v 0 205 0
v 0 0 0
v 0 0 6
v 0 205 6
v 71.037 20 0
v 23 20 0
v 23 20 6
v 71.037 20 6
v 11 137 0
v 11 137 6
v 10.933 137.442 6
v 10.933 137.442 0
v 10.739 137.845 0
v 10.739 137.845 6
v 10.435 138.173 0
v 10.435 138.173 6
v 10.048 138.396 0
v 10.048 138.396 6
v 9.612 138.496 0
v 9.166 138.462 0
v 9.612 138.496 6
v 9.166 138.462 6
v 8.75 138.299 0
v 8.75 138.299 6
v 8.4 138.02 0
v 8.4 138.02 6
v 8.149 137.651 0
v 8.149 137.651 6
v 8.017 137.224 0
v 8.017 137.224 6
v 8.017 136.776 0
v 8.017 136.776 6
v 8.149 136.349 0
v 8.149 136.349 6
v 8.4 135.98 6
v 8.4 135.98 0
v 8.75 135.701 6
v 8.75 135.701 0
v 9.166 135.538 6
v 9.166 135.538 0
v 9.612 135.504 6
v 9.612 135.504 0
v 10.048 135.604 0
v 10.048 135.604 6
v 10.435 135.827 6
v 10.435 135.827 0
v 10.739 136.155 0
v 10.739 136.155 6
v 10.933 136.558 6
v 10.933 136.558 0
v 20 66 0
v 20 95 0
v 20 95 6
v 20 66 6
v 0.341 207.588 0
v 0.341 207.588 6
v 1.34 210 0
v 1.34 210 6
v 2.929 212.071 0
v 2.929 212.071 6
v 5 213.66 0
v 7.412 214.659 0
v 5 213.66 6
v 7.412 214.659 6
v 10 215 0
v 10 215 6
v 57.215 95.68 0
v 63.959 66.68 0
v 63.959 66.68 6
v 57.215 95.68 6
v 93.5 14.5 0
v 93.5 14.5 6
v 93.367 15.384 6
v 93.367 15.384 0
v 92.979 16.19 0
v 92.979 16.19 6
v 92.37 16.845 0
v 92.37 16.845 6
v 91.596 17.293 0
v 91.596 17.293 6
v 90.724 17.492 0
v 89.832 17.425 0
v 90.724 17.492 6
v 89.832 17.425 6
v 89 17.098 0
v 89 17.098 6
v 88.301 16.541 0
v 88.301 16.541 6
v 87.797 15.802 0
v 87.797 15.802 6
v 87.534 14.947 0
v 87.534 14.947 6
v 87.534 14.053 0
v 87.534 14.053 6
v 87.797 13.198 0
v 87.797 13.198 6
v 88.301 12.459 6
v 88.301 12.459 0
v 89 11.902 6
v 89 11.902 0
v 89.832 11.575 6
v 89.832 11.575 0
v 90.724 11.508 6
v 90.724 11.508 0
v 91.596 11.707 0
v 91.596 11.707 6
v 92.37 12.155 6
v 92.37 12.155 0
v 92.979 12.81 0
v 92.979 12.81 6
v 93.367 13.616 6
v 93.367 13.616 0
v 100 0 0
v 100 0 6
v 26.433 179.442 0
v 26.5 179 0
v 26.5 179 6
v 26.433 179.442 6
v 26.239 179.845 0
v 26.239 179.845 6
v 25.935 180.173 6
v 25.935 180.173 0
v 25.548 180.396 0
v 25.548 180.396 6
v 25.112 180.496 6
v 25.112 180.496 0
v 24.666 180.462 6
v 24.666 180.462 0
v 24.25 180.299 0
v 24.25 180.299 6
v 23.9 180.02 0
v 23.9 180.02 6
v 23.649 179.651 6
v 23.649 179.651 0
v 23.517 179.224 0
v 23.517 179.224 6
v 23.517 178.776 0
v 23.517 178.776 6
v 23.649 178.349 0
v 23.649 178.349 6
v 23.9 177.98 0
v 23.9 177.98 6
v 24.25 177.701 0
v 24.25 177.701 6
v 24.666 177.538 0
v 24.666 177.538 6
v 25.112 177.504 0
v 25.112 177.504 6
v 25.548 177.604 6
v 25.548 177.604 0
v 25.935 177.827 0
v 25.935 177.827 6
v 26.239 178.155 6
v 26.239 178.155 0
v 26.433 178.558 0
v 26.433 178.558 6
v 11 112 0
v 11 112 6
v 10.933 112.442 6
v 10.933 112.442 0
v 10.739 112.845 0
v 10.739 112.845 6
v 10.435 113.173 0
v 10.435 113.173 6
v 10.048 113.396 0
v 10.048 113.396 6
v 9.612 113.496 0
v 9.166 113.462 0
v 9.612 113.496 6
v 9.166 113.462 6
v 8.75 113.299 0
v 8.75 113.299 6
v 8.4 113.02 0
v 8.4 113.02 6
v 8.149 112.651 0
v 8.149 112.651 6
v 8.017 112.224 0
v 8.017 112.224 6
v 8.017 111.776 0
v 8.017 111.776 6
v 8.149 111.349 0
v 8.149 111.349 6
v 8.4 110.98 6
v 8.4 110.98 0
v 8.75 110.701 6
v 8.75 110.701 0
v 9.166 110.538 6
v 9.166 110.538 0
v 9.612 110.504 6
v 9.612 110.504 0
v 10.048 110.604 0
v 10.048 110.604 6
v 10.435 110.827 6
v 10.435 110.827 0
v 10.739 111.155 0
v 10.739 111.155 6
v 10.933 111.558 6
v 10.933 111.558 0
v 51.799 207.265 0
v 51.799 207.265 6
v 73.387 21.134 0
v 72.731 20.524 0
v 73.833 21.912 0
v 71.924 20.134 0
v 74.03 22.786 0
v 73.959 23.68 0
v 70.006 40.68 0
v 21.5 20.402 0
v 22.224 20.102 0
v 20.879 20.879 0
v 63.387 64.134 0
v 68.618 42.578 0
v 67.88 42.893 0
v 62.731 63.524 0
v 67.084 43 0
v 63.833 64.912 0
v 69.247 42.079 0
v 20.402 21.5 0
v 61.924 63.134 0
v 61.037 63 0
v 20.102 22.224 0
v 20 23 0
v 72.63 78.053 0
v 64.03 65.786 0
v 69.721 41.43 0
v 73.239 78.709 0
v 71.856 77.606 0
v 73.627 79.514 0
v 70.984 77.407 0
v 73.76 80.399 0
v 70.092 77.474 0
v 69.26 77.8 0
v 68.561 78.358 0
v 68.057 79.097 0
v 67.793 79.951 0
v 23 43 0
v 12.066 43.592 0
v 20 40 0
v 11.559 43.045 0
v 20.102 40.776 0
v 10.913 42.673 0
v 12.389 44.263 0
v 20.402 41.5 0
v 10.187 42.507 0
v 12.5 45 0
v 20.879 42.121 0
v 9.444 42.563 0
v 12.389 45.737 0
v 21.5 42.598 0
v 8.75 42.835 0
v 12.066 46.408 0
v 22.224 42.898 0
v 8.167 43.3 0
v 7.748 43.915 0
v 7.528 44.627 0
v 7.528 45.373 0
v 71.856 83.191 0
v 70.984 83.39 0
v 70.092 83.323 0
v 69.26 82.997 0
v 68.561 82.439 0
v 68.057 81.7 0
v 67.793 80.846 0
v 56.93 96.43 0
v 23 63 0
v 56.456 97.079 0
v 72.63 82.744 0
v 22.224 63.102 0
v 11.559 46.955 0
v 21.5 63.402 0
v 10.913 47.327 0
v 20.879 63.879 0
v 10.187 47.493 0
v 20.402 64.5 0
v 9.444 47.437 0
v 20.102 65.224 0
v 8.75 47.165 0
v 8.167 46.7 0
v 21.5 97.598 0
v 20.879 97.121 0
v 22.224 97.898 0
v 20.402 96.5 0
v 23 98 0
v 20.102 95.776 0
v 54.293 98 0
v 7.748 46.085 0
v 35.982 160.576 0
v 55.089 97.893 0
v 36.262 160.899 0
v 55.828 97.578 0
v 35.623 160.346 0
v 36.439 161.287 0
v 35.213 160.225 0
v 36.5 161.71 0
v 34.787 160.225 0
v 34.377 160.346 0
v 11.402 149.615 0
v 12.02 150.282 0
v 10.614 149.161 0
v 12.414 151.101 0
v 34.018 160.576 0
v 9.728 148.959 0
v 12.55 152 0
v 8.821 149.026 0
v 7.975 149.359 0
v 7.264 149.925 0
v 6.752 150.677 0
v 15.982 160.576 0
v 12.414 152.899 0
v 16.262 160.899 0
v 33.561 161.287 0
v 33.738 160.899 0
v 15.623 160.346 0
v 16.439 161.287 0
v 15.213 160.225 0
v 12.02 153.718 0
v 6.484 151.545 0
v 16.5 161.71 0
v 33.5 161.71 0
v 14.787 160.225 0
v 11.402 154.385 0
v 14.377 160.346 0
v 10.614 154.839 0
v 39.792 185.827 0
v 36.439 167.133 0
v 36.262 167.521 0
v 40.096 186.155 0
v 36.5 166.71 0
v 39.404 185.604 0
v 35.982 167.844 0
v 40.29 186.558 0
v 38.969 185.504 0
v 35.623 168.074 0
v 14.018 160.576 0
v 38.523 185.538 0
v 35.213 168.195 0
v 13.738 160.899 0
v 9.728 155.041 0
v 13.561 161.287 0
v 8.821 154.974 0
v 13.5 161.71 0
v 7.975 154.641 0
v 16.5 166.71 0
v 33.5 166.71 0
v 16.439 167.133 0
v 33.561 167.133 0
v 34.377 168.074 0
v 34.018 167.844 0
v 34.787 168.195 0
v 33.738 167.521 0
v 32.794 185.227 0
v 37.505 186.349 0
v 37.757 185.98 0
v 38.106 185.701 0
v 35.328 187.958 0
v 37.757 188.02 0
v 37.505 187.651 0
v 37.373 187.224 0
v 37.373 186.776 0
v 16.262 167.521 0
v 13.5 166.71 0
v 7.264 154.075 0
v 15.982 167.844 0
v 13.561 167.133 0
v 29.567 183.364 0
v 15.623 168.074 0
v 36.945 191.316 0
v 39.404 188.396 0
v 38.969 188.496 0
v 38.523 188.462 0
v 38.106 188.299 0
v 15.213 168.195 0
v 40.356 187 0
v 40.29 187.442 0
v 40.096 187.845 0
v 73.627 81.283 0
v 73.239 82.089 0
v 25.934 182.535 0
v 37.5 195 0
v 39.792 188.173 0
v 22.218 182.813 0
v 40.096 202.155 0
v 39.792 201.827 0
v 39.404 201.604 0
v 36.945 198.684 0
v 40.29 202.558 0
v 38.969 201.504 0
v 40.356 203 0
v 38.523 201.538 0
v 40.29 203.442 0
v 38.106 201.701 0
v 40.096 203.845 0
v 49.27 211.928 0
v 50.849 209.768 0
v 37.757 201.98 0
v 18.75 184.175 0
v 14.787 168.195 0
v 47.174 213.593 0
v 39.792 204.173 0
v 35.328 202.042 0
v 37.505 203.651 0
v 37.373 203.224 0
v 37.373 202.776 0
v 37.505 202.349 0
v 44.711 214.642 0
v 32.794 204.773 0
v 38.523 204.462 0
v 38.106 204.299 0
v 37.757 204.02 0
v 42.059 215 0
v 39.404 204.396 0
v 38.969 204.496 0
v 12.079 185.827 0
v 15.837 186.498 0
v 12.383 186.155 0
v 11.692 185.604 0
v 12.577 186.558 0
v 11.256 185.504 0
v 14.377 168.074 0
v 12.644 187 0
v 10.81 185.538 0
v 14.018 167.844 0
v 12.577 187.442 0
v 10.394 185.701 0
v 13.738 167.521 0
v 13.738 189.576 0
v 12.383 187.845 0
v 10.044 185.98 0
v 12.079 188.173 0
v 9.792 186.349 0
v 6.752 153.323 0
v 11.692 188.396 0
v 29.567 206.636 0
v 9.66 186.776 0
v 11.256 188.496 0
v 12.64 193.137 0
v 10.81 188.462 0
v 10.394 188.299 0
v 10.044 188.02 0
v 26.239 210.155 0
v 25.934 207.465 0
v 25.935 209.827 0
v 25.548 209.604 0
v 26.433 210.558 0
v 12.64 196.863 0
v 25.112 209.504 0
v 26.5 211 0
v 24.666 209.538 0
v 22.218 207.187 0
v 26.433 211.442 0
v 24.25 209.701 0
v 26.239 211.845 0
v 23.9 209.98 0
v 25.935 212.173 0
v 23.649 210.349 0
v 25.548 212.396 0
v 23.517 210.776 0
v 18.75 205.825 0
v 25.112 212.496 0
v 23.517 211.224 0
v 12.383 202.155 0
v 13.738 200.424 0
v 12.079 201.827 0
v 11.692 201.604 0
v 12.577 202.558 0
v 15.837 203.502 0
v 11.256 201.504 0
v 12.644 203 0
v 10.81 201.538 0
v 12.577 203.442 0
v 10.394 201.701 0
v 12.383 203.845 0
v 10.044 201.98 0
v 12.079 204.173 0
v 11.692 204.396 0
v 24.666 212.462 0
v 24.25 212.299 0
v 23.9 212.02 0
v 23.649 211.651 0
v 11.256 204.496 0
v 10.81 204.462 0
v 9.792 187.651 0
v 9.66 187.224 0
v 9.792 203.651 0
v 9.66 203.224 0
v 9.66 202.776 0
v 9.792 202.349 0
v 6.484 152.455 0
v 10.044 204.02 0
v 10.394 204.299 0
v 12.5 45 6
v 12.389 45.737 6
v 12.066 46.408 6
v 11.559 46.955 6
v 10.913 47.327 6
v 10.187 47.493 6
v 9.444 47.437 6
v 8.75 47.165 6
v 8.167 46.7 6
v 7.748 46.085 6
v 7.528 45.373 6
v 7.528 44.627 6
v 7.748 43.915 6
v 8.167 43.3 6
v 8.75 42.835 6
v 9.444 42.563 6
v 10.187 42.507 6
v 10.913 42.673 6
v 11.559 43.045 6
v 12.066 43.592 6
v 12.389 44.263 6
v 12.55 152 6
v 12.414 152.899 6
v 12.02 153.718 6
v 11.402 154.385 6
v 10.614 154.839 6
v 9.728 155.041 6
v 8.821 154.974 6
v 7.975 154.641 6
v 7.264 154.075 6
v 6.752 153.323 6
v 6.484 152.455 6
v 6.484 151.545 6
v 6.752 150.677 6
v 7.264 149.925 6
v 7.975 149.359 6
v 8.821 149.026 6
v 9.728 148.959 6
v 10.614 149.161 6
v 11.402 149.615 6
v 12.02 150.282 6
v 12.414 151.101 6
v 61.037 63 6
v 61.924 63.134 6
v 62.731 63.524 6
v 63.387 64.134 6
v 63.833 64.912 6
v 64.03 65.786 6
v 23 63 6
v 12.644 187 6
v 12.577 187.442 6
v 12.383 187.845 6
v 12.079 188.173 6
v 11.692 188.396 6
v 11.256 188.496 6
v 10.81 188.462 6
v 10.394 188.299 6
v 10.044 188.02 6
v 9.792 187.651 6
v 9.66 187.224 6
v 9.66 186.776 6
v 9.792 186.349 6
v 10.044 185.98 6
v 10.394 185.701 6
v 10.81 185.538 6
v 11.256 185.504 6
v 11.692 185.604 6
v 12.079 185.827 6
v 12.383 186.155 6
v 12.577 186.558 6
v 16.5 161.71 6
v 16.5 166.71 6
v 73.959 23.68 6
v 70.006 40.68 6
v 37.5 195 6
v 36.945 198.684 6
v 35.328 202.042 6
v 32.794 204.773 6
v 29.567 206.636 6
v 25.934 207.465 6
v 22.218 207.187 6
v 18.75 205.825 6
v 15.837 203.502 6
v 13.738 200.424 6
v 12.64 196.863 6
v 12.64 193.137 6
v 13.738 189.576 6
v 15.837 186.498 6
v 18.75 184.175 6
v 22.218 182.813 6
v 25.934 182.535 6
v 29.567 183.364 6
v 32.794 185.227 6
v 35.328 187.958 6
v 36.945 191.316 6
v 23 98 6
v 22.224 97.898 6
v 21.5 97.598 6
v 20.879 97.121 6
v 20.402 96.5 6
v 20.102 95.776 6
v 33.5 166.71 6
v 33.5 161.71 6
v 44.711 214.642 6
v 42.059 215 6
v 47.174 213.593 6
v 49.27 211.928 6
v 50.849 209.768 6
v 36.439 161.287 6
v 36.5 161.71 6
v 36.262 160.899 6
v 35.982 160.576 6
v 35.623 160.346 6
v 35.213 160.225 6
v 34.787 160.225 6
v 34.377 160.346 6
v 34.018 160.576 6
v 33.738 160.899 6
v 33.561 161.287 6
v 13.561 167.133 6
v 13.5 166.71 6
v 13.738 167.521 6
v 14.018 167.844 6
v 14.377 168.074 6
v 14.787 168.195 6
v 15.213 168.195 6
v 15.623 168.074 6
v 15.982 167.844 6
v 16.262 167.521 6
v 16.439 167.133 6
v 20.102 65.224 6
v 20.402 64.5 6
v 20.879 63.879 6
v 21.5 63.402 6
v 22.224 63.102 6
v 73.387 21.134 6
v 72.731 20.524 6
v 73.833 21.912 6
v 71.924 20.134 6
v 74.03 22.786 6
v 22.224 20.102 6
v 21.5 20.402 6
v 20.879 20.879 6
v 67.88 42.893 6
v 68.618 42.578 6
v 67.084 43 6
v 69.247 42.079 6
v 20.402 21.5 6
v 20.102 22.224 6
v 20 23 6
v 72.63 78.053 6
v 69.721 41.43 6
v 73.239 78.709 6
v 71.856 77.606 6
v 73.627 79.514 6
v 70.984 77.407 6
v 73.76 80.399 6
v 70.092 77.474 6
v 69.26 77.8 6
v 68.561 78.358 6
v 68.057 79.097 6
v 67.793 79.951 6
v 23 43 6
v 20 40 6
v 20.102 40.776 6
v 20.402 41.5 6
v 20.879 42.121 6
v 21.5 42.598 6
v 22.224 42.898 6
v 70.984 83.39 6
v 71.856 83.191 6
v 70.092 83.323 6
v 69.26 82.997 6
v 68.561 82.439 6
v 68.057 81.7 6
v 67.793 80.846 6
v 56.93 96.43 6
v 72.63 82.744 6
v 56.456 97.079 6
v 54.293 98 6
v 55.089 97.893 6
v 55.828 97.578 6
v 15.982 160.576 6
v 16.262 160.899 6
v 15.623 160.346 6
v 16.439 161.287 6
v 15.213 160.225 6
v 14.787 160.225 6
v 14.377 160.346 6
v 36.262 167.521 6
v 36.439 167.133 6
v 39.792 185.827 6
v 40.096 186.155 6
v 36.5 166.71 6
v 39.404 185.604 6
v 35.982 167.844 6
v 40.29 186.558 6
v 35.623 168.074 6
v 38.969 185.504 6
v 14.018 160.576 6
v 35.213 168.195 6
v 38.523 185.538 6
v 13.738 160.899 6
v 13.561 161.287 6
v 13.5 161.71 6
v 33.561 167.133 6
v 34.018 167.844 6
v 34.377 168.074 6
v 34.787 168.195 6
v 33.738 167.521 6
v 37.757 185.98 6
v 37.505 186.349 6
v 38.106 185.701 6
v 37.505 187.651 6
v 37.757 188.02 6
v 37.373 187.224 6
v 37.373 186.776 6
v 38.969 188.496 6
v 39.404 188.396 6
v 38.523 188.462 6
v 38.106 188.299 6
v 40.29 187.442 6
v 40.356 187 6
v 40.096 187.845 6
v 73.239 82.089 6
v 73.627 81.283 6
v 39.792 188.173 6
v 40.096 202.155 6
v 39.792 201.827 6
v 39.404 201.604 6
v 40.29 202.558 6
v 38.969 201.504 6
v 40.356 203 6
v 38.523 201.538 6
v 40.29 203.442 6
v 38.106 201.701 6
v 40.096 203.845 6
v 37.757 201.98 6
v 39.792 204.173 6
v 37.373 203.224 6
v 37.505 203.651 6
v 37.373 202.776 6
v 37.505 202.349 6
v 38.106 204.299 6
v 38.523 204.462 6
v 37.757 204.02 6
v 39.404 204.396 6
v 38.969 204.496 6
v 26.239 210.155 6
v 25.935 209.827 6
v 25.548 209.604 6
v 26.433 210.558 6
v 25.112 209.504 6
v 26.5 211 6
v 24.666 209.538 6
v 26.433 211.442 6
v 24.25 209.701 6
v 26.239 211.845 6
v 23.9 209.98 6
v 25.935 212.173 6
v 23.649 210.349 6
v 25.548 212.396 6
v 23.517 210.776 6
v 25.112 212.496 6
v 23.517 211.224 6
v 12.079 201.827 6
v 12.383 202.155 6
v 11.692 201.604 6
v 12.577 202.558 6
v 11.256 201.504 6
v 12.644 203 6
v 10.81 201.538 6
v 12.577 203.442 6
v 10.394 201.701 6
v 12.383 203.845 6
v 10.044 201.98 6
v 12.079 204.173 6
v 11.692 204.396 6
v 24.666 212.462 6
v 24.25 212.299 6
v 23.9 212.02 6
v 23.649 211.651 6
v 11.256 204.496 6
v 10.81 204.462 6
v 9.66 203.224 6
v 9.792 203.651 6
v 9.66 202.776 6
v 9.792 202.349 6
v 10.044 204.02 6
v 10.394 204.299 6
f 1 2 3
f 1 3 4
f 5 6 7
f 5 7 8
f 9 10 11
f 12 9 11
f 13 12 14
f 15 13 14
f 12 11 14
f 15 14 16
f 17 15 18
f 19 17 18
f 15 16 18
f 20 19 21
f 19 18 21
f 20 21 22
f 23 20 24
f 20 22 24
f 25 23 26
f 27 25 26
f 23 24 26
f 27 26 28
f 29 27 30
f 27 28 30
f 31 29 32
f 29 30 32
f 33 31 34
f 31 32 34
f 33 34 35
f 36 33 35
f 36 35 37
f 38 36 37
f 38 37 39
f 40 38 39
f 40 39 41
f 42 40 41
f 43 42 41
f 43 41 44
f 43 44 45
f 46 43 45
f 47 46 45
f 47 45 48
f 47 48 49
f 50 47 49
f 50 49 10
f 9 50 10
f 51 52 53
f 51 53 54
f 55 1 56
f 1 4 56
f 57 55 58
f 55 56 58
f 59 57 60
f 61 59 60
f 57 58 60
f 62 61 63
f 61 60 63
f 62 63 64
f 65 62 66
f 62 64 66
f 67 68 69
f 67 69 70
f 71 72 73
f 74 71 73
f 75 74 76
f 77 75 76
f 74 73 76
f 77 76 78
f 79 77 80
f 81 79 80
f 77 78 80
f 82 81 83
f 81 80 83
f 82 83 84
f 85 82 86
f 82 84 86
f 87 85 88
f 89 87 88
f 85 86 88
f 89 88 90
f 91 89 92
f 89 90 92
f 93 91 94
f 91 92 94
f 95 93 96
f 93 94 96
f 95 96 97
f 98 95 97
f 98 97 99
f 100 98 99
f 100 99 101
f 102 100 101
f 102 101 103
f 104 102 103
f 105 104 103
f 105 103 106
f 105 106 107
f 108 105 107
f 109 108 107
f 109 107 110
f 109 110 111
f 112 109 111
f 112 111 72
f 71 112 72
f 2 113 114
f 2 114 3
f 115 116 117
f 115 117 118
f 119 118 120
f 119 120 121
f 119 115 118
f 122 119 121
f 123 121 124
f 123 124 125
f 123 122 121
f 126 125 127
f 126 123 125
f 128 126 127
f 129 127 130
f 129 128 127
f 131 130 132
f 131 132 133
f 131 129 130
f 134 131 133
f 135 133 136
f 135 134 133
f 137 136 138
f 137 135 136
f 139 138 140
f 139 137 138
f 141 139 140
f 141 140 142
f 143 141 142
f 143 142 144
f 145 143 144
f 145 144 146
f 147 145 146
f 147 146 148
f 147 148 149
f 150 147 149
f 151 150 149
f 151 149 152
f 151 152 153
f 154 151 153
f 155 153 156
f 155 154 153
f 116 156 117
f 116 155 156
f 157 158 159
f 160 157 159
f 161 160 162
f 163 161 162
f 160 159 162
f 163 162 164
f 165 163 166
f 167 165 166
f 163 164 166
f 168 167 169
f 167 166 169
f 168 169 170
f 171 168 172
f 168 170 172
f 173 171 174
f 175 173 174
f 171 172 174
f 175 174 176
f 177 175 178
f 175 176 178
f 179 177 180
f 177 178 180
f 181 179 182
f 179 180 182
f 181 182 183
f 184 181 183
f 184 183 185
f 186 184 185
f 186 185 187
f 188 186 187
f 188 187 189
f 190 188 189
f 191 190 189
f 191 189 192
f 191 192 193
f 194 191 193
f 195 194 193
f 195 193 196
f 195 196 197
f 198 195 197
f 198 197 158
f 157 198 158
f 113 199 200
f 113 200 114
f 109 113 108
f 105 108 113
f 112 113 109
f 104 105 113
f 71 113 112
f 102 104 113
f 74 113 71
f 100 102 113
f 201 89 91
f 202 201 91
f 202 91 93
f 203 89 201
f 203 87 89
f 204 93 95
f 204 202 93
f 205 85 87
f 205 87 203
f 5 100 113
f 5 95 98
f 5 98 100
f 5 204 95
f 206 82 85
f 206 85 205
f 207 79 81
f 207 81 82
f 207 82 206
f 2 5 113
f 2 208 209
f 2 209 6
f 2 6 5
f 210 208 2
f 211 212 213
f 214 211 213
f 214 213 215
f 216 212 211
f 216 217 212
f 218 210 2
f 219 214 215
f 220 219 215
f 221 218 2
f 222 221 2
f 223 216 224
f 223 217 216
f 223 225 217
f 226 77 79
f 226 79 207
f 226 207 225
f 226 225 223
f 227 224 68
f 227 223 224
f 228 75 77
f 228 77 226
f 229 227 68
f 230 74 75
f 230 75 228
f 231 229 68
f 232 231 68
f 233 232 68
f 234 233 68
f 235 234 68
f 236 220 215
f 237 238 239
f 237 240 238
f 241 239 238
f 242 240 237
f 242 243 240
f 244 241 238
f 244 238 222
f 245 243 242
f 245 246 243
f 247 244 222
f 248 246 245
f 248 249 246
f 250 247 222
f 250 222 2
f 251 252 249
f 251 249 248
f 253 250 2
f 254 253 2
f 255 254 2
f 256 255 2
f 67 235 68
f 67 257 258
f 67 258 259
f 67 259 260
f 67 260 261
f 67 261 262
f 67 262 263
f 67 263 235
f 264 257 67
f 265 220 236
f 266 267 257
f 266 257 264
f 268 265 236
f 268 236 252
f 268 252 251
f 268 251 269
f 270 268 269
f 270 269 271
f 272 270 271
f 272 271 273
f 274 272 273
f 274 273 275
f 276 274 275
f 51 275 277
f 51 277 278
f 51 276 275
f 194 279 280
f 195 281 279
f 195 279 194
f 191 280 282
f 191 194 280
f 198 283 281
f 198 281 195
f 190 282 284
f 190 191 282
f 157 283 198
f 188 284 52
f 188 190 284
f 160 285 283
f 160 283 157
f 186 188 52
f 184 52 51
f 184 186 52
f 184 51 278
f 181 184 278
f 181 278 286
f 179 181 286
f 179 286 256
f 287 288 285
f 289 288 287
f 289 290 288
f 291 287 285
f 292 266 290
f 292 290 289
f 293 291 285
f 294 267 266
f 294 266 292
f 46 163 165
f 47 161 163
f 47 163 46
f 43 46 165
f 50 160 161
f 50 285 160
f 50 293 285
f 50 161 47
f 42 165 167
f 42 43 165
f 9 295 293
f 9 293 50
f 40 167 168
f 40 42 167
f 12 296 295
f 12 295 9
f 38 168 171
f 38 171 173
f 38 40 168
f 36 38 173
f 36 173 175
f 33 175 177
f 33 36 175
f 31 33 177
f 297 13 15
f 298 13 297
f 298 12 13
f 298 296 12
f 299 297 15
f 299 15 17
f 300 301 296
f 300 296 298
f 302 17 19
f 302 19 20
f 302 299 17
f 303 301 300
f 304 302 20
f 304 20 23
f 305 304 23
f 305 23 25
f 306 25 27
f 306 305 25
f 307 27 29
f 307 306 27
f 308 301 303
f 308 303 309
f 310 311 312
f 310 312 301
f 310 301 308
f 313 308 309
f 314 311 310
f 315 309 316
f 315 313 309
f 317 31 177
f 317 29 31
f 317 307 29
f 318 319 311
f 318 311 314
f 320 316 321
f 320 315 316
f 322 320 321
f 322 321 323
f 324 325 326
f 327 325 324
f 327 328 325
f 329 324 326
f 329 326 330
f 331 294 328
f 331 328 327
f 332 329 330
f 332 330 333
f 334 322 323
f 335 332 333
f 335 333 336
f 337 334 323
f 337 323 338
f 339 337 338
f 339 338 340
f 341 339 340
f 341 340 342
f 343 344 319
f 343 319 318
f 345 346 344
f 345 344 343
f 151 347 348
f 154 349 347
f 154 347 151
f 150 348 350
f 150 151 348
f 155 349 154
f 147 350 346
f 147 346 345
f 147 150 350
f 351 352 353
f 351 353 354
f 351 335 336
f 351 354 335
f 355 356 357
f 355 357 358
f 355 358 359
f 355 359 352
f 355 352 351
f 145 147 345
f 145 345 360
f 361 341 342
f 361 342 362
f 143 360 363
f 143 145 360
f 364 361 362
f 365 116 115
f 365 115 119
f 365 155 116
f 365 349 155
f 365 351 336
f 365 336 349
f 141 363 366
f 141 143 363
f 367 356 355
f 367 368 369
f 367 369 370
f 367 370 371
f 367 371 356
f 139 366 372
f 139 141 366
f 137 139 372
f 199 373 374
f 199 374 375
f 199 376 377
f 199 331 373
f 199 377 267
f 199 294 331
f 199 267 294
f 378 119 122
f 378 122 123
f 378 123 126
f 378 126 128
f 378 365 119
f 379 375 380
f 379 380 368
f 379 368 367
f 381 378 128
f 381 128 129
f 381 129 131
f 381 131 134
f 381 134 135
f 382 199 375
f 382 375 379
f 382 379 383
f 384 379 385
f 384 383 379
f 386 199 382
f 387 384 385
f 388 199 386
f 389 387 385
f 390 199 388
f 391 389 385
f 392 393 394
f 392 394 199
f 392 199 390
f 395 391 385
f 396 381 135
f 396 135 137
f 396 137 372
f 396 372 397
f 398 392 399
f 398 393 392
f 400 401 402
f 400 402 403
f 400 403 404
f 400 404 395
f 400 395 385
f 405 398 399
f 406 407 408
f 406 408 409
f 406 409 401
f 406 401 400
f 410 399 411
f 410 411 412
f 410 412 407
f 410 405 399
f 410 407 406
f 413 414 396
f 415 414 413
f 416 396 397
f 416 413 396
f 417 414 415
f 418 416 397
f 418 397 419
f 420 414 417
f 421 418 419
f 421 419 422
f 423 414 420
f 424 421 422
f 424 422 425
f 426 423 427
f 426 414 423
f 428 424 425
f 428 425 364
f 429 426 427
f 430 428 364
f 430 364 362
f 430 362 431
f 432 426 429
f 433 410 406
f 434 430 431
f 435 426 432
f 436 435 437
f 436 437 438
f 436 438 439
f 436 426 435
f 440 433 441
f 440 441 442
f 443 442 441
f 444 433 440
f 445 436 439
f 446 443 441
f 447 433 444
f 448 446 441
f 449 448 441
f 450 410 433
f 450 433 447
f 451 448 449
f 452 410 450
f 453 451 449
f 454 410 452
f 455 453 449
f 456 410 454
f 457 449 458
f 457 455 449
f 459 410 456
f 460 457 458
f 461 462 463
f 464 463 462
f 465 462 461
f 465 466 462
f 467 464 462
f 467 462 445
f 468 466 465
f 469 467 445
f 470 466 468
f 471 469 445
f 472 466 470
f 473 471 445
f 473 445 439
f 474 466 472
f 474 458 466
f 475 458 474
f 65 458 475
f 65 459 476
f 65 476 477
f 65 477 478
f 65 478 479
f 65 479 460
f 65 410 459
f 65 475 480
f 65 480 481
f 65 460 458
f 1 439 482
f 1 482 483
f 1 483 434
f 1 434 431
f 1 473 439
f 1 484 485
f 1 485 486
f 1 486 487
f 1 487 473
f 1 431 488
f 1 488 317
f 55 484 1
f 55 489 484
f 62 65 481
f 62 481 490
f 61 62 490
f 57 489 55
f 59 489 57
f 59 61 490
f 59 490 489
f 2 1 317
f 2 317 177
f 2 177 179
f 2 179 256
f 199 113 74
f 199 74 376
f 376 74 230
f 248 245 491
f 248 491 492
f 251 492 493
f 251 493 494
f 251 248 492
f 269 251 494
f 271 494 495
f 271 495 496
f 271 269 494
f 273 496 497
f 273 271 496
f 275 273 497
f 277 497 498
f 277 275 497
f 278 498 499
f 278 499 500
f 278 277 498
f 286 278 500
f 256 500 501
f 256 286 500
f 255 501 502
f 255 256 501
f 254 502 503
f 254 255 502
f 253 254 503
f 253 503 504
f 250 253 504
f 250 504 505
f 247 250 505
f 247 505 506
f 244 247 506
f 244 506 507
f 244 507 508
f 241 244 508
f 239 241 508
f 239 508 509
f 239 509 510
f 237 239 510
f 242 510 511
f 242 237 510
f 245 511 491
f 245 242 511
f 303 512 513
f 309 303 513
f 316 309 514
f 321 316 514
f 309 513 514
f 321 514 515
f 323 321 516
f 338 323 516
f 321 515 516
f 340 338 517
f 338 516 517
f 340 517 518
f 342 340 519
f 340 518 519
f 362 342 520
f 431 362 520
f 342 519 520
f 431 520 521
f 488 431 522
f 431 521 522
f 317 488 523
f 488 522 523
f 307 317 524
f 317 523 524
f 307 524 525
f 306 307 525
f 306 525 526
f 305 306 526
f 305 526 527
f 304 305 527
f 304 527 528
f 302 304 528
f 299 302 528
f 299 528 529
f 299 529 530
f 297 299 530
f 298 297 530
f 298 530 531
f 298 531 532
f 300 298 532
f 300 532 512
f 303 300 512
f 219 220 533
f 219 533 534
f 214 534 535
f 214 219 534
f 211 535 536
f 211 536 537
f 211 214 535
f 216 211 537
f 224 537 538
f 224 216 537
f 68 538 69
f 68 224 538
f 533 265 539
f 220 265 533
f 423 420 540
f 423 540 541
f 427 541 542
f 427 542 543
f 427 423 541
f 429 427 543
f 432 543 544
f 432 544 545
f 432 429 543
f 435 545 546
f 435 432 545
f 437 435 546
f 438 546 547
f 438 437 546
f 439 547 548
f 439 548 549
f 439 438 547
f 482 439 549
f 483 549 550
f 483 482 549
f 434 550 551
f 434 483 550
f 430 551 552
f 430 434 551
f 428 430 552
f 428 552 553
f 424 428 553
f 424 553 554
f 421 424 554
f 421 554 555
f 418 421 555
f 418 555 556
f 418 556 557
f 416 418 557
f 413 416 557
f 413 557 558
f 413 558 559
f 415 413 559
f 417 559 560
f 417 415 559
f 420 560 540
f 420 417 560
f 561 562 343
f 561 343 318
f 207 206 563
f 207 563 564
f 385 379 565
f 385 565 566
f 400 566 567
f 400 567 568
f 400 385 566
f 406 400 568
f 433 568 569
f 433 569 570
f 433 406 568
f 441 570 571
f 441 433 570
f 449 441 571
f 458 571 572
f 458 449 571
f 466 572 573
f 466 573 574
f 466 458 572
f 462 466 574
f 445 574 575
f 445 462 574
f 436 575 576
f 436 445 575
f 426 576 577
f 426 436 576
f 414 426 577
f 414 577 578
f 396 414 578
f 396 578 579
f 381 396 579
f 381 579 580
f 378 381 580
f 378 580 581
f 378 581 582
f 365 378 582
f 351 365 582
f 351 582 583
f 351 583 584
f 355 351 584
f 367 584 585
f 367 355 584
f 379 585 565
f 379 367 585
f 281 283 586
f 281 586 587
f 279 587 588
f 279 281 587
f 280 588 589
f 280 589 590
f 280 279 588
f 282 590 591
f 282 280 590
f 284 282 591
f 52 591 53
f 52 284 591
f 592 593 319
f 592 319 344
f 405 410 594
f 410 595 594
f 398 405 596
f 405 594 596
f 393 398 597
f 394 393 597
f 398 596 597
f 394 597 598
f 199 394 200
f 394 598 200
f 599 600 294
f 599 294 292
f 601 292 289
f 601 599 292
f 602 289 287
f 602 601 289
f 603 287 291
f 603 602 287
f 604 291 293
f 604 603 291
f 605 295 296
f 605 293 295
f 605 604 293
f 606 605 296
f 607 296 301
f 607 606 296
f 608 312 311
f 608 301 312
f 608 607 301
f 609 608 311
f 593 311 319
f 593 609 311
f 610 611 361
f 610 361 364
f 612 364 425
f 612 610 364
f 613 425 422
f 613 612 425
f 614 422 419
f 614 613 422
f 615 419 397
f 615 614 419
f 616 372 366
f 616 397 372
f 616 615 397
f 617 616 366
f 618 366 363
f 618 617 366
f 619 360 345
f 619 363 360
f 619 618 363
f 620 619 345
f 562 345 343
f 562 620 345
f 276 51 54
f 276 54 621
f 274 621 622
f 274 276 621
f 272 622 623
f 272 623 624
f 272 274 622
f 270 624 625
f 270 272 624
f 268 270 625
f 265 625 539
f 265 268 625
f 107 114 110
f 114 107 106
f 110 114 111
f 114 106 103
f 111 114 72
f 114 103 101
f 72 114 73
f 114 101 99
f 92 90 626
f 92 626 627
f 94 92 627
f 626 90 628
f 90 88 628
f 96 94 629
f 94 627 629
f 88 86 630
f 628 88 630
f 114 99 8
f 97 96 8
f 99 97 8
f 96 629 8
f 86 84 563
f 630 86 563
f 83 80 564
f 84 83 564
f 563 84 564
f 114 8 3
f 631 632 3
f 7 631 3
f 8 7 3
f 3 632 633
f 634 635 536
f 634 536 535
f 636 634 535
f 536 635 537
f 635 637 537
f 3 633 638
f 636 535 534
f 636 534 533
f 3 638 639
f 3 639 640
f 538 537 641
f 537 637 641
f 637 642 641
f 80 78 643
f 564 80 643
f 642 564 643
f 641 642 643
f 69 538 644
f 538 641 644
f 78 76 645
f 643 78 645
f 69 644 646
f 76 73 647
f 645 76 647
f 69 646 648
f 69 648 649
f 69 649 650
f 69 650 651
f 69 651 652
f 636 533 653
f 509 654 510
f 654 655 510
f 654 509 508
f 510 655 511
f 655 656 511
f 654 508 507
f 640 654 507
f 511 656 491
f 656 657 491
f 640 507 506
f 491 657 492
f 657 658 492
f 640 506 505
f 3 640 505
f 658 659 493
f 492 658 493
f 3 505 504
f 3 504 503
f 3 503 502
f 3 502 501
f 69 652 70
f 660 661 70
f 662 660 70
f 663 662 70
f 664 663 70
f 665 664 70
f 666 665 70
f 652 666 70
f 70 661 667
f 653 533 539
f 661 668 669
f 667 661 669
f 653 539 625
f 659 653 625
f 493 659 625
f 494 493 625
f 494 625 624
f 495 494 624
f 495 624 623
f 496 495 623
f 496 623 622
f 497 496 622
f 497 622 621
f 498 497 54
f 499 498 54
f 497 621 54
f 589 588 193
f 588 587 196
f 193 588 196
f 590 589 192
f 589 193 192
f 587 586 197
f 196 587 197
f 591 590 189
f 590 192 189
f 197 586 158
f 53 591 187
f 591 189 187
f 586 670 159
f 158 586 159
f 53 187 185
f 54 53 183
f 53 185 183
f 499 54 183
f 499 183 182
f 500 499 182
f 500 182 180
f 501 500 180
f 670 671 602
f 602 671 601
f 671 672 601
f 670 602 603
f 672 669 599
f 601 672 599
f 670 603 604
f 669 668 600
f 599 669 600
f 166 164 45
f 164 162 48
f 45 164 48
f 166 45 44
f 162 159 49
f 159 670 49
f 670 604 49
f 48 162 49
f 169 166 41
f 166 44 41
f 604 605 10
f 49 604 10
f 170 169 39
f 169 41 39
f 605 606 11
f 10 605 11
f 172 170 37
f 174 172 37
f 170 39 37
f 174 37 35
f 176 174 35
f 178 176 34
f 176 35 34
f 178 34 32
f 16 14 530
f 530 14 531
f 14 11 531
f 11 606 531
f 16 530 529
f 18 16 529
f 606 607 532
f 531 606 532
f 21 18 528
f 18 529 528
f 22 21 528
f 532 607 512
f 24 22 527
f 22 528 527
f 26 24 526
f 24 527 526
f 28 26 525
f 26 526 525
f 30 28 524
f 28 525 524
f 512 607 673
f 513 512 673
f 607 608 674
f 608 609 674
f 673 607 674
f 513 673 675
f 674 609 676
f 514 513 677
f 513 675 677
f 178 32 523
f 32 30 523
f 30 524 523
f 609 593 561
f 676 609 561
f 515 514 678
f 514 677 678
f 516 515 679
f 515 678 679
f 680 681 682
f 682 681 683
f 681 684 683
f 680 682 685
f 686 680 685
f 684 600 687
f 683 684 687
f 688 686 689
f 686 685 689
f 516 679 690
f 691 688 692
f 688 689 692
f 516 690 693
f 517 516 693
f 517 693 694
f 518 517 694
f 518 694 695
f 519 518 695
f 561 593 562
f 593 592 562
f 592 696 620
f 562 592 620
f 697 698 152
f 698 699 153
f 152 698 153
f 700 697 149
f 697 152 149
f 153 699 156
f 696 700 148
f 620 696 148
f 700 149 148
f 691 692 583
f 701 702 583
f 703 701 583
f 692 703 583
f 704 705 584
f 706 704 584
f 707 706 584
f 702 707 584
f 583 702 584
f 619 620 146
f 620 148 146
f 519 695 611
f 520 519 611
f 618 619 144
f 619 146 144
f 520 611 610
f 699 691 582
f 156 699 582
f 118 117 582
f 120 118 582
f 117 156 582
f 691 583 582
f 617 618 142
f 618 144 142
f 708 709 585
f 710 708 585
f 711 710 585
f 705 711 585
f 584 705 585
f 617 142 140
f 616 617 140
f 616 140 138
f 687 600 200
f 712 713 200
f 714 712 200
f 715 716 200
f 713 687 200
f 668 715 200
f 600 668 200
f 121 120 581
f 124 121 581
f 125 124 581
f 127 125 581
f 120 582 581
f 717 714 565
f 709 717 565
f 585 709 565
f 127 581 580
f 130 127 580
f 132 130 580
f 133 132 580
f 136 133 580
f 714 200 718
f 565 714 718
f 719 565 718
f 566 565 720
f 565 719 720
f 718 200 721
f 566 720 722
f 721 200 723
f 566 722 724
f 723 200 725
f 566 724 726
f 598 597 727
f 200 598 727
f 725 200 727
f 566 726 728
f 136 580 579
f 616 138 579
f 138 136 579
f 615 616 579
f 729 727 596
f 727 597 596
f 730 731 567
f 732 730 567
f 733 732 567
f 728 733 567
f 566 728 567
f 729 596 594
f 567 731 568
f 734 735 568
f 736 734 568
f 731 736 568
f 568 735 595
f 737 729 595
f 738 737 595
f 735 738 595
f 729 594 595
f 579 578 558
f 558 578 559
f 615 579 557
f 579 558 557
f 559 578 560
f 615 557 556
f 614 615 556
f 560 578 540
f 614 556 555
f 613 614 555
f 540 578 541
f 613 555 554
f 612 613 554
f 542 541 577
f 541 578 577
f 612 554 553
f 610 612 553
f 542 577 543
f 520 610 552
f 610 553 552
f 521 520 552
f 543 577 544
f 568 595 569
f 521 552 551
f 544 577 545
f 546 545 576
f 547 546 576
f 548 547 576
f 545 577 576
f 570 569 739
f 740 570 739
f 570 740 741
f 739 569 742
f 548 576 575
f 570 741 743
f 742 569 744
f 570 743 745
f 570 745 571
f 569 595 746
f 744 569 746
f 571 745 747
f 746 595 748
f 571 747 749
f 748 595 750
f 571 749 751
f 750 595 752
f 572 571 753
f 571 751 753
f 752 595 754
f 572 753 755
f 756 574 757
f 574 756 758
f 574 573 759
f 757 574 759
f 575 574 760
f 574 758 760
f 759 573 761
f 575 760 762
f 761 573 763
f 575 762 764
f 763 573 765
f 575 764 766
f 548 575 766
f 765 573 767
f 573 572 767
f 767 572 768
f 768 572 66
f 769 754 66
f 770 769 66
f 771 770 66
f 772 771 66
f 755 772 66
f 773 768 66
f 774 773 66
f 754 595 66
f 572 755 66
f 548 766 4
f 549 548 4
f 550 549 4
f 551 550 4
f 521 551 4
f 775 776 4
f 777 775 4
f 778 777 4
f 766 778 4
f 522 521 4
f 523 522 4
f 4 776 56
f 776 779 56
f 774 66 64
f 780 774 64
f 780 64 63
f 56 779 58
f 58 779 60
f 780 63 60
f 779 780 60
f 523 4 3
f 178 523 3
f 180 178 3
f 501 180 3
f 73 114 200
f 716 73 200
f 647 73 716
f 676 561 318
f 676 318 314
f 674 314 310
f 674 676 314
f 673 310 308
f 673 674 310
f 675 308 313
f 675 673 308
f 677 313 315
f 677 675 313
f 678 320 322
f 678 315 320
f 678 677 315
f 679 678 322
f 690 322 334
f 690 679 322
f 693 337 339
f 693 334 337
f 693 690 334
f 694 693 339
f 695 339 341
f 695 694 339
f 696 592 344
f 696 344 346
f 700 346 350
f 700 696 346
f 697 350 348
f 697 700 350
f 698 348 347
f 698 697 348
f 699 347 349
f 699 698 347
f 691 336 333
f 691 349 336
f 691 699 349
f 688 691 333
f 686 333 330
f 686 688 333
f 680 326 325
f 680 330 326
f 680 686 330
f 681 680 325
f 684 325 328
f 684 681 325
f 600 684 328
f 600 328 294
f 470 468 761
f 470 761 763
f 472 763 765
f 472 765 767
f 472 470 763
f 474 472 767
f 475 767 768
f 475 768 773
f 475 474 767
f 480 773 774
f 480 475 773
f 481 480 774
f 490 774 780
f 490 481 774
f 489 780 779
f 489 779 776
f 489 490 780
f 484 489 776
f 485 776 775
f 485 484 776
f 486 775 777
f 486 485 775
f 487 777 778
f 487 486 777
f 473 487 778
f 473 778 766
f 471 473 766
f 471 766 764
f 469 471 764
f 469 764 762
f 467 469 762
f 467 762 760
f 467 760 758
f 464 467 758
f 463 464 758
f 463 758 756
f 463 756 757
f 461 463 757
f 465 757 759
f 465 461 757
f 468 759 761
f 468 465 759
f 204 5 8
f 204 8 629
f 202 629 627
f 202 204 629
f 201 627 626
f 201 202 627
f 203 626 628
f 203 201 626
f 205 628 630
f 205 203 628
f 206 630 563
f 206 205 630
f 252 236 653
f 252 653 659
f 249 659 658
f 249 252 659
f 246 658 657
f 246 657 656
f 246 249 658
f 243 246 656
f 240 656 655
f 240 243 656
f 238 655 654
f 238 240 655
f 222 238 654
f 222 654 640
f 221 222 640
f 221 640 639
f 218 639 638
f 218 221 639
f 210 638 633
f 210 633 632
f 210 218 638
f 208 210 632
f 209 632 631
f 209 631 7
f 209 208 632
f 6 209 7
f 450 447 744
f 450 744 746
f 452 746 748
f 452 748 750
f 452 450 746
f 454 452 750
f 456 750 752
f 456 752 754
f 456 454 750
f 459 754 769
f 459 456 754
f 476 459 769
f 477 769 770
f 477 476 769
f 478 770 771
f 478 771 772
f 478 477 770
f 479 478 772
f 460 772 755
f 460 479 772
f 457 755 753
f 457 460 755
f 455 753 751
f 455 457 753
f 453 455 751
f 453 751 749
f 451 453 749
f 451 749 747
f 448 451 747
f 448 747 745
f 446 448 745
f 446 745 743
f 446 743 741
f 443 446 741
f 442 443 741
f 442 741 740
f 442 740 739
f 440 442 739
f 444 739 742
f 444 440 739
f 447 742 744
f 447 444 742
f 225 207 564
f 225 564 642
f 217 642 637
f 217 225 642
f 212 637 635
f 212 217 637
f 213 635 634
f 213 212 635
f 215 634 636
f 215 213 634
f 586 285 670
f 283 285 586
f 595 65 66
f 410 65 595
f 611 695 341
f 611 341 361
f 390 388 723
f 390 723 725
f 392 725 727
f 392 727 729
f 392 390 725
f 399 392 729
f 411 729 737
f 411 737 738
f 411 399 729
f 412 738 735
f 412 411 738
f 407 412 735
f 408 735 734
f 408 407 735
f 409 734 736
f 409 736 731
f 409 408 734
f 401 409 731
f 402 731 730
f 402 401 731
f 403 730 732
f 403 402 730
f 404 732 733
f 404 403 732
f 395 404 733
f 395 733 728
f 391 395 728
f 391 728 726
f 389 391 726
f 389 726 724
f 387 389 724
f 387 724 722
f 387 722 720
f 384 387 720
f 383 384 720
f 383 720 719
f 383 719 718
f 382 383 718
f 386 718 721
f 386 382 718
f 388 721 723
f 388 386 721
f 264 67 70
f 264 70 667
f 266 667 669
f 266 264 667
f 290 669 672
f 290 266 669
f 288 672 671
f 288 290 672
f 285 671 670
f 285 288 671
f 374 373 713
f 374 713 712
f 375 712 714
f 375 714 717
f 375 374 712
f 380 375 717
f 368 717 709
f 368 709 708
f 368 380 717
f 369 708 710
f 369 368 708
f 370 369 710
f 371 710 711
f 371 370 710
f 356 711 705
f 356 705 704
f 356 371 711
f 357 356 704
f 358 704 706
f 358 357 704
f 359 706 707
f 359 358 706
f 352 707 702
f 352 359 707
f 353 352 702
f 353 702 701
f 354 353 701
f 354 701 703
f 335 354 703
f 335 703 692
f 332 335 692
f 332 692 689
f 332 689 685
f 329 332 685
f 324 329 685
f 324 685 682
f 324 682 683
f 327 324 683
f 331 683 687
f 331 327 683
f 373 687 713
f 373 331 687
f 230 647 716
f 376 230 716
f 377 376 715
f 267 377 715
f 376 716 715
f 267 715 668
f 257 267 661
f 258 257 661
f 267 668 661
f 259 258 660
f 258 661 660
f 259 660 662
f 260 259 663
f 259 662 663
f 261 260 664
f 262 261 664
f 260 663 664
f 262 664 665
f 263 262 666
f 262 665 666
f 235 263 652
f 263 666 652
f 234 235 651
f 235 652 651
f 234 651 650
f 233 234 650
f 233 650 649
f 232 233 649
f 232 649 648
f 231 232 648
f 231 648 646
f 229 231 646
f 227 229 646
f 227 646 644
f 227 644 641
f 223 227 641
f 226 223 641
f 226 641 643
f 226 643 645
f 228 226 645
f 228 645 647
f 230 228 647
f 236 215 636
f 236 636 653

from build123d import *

# Parameters (mm, degrees)
ESBO_O1_R                = 12.5
ESBO_O1_R_2              = 1.5
ESBO_O1_R_3              = 2.5
RESSALTO_EXTRUS_O2_DEPTH = 6
FILETE1_R                = 10
ESBO_O2_R                = 1.5
ESBO_O2_R_2              = 3
ESBO_O2_R_3              = 3.05
CORTE_EXTRUS_O1_DEPTH    = 238.194013415
ESBO_O3_R                = 3
CORTE_EXTRUS_O2_DEPTH    = 238.194013415


with BuildPart() as part:
    # Esboço1 → Ressalto-extrusão2 (new body)
    with BuildSketch(Plane.XY):
        Polygon((0, 0), (0, 215), (50, 215), (100, 0), align=None)
        with Locations((25, 195)):
            Circle(ESBO_O1_R, mode=Mode.SUBTRACT)
        with Locations((25, 211)):
            Circle(ESBO_O1_R_2, mode=Mode.SUBTRACT)
        with Locations((38.856406461, 203)):
            Circle(ESBO_O1_R_2, mode=Mode.SUBTRACT)
        with Locations((38.856406461, 187)):
            Circle(ESBO_O1_R_2, mode=Mode.SUBTRACT)
        with Locations((25, 179)):
            Circle(ESBO_O1_R_2, mode=Mode.SUBTRACT)
        with Locations((11.143593539, 187)):
            Circle(ESBO_O1_R_2, mode=Mode.SUBTRACT)
        with Locations((11.143593539, 203)):
            Circle(ESBO_O1_R_2, mode=Mode.SUBTRACT)
        with Locations((10, 45)):
            Circle(ESBO_O1_R_3, mode=Mode.SUBTRACT)
        with BuildLine():
            Line((20, 95), (20, 66))
            ThreePointArc((20, 66), (20.878679656, 63.878679656), (23, 63))
            Line((23, 63), (61.03739436, 63))
            ThreePointArc((61.03739436, 63), (63.386715693, 64.134339454), (63.959418441, 66.679540484))
            Line((63.959418441, 66.679540484), (57.215232395, 95.679540484))
            ThreePointArc((57.215232395, 95.679540484), (56.15886886, 97.349321333), (54.293208314, 98))
            Line((54.293208314, 98), (23, 98))
            ThreePointArc((23, 98), (20.878679656, 97.121320344), (20, 95))
        make_face(mode=Mode.SUBTRACT)
        with BuildLine():
            Line((20, 40), (20, 23))
            ThreePointArc((20, 23), (20.878679656, 20.878679656), (23, 20))
            Line((23, 20), (71.03739436, 20))
            ThreePointArc((71.03739436, 20), (73.386715693, 21.134339454), (73.959418441, 23.679540484))
            Line((73.959418441, 23.679540484), (70.005930069, 40.679540484))
            ThreePointArc((70.005930069, 40.679540484), (68.949566534, 42.349321333), (67.083905988, 43))
            Line((67.083905988, 43), (23, 43))
            ThreePointArc((23, 43), (20.878679656, 42.121320344), (20, 40))
        make_face(mode=Mode.SUBTRACT)
    extrude(amount=RESSALTO_EXTRUS_O2_DEPTH)

    # Filete1
    filete1_edges = [part.edges().sort_by_distance(p)[0] for p in [
        (0, 215, 3),
        (50, 215, 3),
    ]]
    fillet(filete1_edges, radius=FILETE1_R)

    # Esboço2 → Corte-extrusão1 (cut, through all)
    with BuildSketch(Plane.XY.offset(6)):
        with Locations((9.5, 137)):
            Circle(ESBO_O2_R)
        with Locations((90.5, 14.5)):
            Circle(ESBO_O2_R_2)
        with Locations((9.5, 112)):
            Circle(ESBO_O2_R)
        with Locations((9.5, 152)):
            Circle(ESBO_O2_R_3)
        with BuildLine():
            Line((13.5, 161.71), (13.5, 166.71))
            ThreePointArc((13.5, 166.71), (15, 168.21), (16.5, 166.71))
            Line((16.5, 166.71), (16.5, 161.71))
            ThreePointArc((16.5, 161.71), (15, 160.21), (13.5, 161.71))
        make_face()
        with BuildLine():
            Line((33.5, 161.71), (33.5, 166.71))
            ThreePointArc((33.5, 166.71), (35, 168.21), (36.5, 166.71))
            Line((36.5, 166.71), (36.5, 161.71))
            ThreePointArc((36.5, 161.71), (35, 160.21), (33.5, 161.71))
        make_face()
    extrude(amount=-CORTE_EXTRUS_O1_DEPTH, mode=Mode.SUBTRACT)

    # Esboço3 → Corte-extrusão2 (cut, through all)
    with BuildSketch(Plane.XY.offset(6)):
        with Locations((70.759810426, 80.398555206)):
            Circle(ESBO_O3_R)
    extrude(amount=-CORTE_EXTRUS_O2_DEPTH, mode=Mode.SUBTRACT)


solid = part.part
